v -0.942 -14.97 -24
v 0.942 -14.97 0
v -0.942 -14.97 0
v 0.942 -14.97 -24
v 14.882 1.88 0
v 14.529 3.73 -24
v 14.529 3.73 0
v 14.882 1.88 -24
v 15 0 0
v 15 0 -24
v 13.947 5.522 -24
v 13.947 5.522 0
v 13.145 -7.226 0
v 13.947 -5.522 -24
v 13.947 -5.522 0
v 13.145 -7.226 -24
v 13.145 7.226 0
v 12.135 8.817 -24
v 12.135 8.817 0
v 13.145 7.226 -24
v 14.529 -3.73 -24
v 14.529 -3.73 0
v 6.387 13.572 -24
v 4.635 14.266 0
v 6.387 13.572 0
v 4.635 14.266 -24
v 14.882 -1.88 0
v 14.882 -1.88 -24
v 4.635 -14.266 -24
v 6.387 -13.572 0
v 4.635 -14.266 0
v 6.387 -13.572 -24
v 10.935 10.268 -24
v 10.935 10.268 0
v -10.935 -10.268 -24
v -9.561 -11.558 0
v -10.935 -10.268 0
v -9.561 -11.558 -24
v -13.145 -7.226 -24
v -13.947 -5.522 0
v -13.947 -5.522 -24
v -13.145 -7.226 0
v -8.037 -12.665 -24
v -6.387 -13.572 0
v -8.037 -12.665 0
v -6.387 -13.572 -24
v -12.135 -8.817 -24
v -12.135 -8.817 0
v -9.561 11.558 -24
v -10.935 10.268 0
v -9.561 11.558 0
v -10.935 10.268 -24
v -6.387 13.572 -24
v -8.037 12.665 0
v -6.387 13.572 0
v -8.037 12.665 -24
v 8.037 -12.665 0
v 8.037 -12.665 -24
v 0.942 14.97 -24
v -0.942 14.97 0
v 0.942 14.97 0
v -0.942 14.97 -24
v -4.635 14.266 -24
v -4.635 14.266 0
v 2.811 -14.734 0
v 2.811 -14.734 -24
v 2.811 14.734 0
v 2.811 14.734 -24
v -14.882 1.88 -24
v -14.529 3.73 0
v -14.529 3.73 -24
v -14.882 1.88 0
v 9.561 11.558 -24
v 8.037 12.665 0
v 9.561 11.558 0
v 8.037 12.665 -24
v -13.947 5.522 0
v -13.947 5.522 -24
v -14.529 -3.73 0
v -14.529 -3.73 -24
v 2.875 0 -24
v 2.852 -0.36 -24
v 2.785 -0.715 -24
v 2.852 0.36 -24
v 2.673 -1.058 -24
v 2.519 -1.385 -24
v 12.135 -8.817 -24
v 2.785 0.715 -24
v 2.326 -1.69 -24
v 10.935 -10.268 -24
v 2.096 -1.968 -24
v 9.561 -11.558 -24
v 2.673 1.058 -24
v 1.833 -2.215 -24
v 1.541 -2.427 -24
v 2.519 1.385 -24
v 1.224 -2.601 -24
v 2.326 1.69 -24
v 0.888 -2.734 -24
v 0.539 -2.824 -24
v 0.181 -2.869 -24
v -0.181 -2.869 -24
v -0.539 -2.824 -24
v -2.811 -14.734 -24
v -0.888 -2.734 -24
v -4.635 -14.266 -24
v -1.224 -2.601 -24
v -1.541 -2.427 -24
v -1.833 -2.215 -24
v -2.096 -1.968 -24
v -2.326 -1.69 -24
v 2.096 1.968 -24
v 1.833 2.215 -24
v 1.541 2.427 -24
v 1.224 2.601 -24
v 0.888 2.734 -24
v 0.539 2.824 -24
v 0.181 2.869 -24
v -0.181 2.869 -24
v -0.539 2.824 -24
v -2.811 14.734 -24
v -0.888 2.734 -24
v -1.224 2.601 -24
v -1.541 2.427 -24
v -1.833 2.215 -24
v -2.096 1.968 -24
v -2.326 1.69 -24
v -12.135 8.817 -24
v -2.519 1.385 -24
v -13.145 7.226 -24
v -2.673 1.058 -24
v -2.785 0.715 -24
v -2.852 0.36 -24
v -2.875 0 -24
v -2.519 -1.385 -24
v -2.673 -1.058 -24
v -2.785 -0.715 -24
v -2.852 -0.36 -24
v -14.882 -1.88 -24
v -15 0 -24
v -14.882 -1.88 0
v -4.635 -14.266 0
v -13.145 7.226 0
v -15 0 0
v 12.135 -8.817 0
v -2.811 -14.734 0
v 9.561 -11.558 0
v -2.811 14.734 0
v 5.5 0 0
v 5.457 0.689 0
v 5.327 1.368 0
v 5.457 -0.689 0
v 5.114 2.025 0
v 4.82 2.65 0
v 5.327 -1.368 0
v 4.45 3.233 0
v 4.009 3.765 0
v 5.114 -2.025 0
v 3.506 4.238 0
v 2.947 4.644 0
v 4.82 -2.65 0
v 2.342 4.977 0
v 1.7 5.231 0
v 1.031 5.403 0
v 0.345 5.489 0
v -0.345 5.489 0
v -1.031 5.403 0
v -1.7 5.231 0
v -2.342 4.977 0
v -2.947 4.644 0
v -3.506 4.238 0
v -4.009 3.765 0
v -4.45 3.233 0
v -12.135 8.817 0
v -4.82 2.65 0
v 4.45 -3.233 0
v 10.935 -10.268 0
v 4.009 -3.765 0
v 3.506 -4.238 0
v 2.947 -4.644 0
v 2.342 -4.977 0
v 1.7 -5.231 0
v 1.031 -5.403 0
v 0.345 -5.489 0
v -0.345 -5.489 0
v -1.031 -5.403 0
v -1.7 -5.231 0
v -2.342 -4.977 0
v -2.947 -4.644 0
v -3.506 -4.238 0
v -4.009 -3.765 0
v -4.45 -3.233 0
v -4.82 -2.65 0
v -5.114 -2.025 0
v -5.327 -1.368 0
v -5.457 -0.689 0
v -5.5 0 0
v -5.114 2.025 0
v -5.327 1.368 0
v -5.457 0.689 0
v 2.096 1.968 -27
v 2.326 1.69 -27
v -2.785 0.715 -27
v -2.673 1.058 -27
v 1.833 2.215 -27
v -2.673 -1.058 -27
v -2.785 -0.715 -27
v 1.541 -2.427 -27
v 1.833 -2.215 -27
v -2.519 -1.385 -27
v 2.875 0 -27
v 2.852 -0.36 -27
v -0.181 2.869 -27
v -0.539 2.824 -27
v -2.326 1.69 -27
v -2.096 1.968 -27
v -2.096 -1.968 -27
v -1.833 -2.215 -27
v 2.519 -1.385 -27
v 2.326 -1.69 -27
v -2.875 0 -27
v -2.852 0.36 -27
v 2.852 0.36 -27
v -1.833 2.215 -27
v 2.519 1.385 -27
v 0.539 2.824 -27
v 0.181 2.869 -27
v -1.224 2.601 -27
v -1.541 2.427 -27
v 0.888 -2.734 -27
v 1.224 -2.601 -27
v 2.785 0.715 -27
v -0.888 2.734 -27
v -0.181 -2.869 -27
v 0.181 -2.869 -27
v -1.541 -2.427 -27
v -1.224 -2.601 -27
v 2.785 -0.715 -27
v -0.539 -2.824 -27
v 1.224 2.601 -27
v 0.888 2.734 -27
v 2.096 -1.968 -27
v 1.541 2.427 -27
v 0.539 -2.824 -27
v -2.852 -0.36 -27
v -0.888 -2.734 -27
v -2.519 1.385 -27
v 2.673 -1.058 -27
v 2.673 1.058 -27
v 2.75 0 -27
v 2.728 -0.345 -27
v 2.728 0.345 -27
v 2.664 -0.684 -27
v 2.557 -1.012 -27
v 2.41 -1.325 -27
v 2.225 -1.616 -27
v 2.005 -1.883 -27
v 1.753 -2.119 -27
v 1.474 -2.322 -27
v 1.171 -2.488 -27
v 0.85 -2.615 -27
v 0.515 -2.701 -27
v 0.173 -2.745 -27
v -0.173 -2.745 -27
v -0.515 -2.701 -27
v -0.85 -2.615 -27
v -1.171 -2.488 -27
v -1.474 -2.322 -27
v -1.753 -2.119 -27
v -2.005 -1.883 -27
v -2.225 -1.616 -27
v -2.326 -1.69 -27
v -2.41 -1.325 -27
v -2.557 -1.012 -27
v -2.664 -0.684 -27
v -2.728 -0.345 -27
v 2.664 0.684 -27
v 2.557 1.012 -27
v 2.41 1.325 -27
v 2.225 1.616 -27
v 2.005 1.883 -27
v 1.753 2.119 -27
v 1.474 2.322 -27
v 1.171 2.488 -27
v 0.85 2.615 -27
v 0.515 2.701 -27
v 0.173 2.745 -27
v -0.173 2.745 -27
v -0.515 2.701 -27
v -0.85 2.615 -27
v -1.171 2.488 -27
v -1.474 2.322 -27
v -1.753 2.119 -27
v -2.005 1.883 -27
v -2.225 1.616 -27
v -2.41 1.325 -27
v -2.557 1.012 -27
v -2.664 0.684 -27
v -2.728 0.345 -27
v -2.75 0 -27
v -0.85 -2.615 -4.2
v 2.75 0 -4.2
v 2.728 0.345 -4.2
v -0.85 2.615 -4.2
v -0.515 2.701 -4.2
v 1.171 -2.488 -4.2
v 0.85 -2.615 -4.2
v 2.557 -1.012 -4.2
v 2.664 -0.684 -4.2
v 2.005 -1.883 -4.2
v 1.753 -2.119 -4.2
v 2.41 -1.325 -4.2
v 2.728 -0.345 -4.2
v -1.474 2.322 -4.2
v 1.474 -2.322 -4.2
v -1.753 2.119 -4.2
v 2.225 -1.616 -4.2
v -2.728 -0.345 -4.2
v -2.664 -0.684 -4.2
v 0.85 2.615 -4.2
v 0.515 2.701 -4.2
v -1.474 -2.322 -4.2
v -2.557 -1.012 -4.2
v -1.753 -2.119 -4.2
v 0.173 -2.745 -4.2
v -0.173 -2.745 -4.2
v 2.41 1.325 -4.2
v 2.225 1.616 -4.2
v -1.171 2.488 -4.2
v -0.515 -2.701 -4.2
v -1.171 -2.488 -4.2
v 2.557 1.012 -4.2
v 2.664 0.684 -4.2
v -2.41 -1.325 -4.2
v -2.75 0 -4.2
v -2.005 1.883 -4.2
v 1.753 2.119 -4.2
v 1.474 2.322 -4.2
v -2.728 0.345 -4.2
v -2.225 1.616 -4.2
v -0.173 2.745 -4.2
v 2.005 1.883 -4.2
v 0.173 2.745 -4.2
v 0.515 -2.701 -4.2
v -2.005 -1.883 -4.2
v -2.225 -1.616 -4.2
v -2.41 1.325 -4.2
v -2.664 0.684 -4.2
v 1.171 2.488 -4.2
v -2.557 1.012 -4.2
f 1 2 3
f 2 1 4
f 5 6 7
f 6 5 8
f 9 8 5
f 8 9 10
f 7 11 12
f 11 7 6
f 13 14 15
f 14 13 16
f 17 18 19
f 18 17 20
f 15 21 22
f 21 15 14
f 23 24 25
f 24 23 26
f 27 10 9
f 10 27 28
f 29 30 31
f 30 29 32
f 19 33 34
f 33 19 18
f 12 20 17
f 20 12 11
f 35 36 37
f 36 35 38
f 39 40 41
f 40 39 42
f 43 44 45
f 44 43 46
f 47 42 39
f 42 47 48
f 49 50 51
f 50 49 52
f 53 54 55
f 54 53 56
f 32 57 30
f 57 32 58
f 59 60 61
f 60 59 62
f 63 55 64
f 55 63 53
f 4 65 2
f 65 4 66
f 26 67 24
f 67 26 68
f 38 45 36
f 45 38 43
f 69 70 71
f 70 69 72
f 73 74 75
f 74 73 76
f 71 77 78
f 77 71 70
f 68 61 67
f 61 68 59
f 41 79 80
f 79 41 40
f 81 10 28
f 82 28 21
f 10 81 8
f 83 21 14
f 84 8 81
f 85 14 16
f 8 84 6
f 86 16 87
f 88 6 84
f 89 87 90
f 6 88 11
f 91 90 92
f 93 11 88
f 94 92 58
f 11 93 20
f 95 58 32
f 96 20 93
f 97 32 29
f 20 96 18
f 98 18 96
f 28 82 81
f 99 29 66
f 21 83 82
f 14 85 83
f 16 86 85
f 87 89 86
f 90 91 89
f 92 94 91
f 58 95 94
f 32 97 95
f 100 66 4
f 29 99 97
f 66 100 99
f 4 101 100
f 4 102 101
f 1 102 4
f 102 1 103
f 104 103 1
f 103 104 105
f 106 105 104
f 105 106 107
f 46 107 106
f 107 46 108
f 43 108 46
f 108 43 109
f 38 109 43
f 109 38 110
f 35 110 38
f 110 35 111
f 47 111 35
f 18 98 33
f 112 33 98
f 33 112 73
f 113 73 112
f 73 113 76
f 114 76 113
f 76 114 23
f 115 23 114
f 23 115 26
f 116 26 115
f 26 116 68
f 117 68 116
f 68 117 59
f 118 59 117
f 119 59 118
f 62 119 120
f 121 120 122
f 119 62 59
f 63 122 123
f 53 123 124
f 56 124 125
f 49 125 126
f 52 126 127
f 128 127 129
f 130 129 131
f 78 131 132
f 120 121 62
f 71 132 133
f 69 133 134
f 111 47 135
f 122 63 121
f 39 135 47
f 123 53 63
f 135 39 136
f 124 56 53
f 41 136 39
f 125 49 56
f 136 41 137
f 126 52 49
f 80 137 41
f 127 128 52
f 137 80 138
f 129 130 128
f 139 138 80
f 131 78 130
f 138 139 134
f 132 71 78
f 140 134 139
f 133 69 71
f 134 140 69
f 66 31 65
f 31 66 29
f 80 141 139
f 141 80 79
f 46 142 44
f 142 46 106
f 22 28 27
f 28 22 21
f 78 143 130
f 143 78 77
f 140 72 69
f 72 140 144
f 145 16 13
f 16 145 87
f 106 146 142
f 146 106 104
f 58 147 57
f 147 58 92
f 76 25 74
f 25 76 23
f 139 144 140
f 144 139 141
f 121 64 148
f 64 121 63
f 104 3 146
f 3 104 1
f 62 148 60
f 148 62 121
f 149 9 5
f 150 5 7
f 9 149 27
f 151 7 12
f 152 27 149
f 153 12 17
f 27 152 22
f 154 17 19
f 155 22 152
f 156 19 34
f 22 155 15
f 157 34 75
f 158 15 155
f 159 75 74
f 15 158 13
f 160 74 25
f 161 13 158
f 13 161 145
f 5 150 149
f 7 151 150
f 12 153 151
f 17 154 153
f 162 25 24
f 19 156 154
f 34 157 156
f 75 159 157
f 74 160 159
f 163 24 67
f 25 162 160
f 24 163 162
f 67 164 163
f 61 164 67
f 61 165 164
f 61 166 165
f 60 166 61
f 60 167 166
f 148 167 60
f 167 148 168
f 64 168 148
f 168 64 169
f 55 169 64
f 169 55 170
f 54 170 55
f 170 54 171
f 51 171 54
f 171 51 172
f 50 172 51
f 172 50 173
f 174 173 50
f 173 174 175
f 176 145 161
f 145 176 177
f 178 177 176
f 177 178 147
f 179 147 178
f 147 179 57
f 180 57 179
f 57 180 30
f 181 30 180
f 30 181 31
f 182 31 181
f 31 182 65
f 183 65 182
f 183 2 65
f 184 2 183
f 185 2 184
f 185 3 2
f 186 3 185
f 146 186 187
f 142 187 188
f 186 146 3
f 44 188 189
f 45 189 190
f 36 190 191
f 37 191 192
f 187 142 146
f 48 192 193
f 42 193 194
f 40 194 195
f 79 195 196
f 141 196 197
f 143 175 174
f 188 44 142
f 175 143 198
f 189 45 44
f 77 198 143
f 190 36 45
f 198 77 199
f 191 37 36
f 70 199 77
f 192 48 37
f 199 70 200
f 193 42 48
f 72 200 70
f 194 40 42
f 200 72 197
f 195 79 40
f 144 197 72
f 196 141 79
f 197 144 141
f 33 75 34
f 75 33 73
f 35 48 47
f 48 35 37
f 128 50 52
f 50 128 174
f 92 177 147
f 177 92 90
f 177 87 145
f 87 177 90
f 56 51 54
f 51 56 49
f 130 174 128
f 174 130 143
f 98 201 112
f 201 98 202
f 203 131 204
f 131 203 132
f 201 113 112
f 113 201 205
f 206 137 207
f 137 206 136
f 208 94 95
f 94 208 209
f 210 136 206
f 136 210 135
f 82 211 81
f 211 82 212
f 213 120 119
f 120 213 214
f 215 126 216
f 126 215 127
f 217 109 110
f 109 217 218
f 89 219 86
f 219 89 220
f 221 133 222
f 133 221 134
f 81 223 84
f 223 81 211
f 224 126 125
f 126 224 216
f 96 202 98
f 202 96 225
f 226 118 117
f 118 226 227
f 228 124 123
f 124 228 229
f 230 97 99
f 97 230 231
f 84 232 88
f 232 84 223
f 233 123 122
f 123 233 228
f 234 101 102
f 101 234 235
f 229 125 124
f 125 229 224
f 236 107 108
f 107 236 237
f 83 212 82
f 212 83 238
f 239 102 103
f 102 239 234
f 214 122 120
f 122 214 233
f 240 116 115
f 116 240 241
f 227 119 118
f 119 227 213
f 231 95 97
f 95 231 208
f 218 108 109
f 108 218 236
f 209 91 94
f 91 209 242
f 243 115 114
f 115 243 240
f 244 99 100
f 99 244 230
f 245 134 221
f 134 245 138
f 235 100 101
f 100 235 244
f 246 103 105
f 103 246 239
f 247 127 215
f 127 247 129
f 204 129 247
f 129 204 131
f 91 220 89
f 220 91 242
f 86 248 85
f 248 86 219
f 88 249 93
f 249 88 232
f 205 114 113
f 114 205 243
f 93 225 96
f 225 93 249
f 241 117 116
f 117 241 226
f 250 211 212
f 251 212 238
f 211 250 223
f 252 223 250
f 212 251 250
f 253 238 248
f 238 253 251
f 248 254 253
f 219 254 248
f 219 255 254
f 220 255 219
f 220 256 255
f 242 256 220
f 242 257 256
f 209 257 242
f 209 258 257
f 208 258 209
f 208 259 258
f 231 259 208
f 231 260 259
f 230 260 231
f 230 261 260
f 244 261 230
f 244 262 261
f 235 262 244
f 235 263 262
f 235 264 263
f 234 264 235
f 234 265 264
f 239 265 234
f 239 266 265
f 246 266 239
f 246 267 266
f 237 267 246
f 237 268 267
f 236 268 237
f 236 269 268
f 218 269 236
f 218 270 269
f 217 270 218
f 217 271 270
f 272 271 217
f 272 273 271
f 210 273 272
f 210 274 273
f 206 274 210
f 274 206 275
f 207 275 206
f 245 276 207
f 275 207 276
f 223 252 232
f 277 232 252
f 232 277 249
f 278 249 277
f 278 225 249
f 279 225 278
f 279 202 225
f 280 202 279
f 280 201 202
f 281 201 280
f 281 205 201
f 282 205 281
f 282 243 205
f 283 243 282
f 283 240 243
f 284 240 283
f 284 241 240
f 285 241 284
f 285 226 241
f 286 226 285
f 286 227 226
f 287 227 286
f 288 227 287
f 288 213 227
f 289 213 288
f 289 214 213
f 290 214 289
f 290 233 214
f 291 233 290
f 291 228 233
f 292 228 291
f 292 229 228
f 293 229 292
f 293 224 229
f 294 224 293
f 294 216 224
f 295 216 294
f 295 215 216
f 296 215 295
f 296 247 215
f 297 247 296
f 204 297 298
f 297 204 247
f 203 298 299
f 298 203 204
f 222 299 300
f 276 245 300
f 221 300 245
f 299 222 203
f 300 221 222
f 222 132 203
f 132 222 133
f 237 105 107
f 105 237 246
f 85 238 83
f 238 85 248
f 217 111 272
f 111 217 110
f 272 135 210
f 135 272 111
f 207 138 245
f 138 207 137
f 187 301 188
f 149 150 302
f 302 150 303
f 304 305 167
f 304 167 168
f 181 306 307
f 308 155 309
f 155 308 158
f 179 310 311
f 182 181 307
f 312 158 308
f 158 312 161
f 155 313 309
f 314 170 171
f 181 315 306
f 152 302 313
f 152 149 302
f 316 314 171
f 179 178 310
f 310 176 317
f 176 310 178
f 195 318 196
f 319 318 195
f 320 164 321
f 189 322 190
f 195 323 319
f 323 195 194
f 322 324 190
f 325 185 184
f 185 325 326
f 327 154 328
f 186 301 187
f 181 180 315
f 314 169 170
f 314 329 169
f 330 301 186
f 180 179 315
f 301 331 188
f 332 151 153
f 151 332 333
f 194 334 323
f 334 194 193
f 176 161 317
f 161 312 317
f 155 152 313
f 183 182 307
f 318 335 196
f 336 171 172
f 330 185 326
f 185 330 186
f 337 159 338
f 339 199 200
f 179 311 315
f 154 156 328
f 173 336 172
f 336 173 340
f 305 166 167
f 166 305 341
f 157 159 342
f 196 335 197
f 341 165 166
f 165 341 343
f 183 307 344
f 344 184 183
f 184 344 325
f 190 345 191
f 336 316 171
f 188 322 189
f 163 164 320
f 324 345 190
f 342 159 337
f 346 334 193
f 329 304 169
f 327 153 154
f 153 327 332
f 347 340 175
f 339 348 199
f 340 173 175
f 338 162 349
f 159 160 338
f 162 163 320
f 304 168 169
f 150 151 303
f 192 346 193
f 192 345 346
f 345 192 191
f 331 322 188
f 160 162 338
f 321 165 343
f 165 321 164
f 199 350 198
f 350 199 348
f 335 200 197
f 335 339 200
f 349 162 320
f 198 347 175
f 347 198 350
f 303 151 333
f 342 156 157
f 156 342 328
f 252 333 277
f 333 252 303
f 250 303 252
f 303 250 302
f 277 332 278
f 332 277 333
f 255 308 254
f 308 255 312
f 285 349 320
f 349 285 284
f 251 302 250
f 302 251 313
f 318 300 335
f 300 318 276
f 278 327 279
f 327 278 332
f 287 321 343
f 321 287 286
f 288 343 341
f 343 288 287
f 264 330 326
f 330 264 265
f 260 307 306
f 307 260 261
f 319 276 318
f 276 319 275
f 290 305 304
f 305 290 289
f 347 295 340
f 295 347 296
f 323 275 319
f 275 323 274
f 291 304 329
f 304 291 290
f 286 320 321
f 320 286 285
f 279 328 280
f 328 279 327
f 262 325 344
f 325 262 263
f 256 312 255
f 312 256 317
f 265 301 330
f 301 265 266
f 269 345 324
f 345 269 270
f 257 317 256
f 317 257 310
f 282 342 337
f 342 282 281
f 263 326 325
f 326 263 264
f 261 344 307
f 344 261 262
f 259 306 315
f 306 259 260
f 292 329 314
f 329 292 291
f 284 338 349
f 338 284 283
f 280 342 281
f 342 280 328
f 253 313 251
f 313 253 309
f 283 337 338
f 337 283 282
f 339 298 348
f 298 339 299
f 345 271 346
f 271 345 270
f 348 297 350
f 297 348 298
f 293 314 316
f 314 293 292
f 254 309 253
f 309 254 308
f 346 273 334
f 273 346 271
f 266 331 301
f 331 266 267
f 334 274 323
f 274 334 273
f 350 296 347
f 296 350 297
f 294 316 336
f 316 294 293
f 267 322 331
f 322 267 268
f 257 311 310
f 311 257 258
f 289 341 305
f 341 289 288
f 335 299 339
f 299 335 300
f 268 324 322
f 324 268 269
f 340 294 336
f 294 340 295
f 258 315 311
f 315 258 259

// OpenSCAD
$fn = 50;

difference() {
	union() {
		translate(v = [0, 0, -24.0]) {
			cylinder(h = 24, r = 15.0);
		}
		#translate(v = [0, 0, -27.0]) {
			cylinder(h = 27, r = 2.875);
		}
	}
	union() {
		translate(v = [0, 0, 0]) {
			rotate(a = [0, 0, 0]) {
				difference() {
					union() {
						translate(v = [0, 0, -27.0]) {
							cylinder(h = 27, r = 2.25);
						}
						translate(v = [0, 0, -4.2]) {
							cylinder(h = 4.2, r1 = 2.75, r2 = 5.5);
						}
						translate(v = [0, 0, -27.0]) {
							cylinder(h = 27, r = 2.75);
						}
						translate(v = [0, 0, -27.0]) {
							cylinder(h = 27, r = 2.25);
						}
					}
					union();
				}
			}
		}
	}
}
